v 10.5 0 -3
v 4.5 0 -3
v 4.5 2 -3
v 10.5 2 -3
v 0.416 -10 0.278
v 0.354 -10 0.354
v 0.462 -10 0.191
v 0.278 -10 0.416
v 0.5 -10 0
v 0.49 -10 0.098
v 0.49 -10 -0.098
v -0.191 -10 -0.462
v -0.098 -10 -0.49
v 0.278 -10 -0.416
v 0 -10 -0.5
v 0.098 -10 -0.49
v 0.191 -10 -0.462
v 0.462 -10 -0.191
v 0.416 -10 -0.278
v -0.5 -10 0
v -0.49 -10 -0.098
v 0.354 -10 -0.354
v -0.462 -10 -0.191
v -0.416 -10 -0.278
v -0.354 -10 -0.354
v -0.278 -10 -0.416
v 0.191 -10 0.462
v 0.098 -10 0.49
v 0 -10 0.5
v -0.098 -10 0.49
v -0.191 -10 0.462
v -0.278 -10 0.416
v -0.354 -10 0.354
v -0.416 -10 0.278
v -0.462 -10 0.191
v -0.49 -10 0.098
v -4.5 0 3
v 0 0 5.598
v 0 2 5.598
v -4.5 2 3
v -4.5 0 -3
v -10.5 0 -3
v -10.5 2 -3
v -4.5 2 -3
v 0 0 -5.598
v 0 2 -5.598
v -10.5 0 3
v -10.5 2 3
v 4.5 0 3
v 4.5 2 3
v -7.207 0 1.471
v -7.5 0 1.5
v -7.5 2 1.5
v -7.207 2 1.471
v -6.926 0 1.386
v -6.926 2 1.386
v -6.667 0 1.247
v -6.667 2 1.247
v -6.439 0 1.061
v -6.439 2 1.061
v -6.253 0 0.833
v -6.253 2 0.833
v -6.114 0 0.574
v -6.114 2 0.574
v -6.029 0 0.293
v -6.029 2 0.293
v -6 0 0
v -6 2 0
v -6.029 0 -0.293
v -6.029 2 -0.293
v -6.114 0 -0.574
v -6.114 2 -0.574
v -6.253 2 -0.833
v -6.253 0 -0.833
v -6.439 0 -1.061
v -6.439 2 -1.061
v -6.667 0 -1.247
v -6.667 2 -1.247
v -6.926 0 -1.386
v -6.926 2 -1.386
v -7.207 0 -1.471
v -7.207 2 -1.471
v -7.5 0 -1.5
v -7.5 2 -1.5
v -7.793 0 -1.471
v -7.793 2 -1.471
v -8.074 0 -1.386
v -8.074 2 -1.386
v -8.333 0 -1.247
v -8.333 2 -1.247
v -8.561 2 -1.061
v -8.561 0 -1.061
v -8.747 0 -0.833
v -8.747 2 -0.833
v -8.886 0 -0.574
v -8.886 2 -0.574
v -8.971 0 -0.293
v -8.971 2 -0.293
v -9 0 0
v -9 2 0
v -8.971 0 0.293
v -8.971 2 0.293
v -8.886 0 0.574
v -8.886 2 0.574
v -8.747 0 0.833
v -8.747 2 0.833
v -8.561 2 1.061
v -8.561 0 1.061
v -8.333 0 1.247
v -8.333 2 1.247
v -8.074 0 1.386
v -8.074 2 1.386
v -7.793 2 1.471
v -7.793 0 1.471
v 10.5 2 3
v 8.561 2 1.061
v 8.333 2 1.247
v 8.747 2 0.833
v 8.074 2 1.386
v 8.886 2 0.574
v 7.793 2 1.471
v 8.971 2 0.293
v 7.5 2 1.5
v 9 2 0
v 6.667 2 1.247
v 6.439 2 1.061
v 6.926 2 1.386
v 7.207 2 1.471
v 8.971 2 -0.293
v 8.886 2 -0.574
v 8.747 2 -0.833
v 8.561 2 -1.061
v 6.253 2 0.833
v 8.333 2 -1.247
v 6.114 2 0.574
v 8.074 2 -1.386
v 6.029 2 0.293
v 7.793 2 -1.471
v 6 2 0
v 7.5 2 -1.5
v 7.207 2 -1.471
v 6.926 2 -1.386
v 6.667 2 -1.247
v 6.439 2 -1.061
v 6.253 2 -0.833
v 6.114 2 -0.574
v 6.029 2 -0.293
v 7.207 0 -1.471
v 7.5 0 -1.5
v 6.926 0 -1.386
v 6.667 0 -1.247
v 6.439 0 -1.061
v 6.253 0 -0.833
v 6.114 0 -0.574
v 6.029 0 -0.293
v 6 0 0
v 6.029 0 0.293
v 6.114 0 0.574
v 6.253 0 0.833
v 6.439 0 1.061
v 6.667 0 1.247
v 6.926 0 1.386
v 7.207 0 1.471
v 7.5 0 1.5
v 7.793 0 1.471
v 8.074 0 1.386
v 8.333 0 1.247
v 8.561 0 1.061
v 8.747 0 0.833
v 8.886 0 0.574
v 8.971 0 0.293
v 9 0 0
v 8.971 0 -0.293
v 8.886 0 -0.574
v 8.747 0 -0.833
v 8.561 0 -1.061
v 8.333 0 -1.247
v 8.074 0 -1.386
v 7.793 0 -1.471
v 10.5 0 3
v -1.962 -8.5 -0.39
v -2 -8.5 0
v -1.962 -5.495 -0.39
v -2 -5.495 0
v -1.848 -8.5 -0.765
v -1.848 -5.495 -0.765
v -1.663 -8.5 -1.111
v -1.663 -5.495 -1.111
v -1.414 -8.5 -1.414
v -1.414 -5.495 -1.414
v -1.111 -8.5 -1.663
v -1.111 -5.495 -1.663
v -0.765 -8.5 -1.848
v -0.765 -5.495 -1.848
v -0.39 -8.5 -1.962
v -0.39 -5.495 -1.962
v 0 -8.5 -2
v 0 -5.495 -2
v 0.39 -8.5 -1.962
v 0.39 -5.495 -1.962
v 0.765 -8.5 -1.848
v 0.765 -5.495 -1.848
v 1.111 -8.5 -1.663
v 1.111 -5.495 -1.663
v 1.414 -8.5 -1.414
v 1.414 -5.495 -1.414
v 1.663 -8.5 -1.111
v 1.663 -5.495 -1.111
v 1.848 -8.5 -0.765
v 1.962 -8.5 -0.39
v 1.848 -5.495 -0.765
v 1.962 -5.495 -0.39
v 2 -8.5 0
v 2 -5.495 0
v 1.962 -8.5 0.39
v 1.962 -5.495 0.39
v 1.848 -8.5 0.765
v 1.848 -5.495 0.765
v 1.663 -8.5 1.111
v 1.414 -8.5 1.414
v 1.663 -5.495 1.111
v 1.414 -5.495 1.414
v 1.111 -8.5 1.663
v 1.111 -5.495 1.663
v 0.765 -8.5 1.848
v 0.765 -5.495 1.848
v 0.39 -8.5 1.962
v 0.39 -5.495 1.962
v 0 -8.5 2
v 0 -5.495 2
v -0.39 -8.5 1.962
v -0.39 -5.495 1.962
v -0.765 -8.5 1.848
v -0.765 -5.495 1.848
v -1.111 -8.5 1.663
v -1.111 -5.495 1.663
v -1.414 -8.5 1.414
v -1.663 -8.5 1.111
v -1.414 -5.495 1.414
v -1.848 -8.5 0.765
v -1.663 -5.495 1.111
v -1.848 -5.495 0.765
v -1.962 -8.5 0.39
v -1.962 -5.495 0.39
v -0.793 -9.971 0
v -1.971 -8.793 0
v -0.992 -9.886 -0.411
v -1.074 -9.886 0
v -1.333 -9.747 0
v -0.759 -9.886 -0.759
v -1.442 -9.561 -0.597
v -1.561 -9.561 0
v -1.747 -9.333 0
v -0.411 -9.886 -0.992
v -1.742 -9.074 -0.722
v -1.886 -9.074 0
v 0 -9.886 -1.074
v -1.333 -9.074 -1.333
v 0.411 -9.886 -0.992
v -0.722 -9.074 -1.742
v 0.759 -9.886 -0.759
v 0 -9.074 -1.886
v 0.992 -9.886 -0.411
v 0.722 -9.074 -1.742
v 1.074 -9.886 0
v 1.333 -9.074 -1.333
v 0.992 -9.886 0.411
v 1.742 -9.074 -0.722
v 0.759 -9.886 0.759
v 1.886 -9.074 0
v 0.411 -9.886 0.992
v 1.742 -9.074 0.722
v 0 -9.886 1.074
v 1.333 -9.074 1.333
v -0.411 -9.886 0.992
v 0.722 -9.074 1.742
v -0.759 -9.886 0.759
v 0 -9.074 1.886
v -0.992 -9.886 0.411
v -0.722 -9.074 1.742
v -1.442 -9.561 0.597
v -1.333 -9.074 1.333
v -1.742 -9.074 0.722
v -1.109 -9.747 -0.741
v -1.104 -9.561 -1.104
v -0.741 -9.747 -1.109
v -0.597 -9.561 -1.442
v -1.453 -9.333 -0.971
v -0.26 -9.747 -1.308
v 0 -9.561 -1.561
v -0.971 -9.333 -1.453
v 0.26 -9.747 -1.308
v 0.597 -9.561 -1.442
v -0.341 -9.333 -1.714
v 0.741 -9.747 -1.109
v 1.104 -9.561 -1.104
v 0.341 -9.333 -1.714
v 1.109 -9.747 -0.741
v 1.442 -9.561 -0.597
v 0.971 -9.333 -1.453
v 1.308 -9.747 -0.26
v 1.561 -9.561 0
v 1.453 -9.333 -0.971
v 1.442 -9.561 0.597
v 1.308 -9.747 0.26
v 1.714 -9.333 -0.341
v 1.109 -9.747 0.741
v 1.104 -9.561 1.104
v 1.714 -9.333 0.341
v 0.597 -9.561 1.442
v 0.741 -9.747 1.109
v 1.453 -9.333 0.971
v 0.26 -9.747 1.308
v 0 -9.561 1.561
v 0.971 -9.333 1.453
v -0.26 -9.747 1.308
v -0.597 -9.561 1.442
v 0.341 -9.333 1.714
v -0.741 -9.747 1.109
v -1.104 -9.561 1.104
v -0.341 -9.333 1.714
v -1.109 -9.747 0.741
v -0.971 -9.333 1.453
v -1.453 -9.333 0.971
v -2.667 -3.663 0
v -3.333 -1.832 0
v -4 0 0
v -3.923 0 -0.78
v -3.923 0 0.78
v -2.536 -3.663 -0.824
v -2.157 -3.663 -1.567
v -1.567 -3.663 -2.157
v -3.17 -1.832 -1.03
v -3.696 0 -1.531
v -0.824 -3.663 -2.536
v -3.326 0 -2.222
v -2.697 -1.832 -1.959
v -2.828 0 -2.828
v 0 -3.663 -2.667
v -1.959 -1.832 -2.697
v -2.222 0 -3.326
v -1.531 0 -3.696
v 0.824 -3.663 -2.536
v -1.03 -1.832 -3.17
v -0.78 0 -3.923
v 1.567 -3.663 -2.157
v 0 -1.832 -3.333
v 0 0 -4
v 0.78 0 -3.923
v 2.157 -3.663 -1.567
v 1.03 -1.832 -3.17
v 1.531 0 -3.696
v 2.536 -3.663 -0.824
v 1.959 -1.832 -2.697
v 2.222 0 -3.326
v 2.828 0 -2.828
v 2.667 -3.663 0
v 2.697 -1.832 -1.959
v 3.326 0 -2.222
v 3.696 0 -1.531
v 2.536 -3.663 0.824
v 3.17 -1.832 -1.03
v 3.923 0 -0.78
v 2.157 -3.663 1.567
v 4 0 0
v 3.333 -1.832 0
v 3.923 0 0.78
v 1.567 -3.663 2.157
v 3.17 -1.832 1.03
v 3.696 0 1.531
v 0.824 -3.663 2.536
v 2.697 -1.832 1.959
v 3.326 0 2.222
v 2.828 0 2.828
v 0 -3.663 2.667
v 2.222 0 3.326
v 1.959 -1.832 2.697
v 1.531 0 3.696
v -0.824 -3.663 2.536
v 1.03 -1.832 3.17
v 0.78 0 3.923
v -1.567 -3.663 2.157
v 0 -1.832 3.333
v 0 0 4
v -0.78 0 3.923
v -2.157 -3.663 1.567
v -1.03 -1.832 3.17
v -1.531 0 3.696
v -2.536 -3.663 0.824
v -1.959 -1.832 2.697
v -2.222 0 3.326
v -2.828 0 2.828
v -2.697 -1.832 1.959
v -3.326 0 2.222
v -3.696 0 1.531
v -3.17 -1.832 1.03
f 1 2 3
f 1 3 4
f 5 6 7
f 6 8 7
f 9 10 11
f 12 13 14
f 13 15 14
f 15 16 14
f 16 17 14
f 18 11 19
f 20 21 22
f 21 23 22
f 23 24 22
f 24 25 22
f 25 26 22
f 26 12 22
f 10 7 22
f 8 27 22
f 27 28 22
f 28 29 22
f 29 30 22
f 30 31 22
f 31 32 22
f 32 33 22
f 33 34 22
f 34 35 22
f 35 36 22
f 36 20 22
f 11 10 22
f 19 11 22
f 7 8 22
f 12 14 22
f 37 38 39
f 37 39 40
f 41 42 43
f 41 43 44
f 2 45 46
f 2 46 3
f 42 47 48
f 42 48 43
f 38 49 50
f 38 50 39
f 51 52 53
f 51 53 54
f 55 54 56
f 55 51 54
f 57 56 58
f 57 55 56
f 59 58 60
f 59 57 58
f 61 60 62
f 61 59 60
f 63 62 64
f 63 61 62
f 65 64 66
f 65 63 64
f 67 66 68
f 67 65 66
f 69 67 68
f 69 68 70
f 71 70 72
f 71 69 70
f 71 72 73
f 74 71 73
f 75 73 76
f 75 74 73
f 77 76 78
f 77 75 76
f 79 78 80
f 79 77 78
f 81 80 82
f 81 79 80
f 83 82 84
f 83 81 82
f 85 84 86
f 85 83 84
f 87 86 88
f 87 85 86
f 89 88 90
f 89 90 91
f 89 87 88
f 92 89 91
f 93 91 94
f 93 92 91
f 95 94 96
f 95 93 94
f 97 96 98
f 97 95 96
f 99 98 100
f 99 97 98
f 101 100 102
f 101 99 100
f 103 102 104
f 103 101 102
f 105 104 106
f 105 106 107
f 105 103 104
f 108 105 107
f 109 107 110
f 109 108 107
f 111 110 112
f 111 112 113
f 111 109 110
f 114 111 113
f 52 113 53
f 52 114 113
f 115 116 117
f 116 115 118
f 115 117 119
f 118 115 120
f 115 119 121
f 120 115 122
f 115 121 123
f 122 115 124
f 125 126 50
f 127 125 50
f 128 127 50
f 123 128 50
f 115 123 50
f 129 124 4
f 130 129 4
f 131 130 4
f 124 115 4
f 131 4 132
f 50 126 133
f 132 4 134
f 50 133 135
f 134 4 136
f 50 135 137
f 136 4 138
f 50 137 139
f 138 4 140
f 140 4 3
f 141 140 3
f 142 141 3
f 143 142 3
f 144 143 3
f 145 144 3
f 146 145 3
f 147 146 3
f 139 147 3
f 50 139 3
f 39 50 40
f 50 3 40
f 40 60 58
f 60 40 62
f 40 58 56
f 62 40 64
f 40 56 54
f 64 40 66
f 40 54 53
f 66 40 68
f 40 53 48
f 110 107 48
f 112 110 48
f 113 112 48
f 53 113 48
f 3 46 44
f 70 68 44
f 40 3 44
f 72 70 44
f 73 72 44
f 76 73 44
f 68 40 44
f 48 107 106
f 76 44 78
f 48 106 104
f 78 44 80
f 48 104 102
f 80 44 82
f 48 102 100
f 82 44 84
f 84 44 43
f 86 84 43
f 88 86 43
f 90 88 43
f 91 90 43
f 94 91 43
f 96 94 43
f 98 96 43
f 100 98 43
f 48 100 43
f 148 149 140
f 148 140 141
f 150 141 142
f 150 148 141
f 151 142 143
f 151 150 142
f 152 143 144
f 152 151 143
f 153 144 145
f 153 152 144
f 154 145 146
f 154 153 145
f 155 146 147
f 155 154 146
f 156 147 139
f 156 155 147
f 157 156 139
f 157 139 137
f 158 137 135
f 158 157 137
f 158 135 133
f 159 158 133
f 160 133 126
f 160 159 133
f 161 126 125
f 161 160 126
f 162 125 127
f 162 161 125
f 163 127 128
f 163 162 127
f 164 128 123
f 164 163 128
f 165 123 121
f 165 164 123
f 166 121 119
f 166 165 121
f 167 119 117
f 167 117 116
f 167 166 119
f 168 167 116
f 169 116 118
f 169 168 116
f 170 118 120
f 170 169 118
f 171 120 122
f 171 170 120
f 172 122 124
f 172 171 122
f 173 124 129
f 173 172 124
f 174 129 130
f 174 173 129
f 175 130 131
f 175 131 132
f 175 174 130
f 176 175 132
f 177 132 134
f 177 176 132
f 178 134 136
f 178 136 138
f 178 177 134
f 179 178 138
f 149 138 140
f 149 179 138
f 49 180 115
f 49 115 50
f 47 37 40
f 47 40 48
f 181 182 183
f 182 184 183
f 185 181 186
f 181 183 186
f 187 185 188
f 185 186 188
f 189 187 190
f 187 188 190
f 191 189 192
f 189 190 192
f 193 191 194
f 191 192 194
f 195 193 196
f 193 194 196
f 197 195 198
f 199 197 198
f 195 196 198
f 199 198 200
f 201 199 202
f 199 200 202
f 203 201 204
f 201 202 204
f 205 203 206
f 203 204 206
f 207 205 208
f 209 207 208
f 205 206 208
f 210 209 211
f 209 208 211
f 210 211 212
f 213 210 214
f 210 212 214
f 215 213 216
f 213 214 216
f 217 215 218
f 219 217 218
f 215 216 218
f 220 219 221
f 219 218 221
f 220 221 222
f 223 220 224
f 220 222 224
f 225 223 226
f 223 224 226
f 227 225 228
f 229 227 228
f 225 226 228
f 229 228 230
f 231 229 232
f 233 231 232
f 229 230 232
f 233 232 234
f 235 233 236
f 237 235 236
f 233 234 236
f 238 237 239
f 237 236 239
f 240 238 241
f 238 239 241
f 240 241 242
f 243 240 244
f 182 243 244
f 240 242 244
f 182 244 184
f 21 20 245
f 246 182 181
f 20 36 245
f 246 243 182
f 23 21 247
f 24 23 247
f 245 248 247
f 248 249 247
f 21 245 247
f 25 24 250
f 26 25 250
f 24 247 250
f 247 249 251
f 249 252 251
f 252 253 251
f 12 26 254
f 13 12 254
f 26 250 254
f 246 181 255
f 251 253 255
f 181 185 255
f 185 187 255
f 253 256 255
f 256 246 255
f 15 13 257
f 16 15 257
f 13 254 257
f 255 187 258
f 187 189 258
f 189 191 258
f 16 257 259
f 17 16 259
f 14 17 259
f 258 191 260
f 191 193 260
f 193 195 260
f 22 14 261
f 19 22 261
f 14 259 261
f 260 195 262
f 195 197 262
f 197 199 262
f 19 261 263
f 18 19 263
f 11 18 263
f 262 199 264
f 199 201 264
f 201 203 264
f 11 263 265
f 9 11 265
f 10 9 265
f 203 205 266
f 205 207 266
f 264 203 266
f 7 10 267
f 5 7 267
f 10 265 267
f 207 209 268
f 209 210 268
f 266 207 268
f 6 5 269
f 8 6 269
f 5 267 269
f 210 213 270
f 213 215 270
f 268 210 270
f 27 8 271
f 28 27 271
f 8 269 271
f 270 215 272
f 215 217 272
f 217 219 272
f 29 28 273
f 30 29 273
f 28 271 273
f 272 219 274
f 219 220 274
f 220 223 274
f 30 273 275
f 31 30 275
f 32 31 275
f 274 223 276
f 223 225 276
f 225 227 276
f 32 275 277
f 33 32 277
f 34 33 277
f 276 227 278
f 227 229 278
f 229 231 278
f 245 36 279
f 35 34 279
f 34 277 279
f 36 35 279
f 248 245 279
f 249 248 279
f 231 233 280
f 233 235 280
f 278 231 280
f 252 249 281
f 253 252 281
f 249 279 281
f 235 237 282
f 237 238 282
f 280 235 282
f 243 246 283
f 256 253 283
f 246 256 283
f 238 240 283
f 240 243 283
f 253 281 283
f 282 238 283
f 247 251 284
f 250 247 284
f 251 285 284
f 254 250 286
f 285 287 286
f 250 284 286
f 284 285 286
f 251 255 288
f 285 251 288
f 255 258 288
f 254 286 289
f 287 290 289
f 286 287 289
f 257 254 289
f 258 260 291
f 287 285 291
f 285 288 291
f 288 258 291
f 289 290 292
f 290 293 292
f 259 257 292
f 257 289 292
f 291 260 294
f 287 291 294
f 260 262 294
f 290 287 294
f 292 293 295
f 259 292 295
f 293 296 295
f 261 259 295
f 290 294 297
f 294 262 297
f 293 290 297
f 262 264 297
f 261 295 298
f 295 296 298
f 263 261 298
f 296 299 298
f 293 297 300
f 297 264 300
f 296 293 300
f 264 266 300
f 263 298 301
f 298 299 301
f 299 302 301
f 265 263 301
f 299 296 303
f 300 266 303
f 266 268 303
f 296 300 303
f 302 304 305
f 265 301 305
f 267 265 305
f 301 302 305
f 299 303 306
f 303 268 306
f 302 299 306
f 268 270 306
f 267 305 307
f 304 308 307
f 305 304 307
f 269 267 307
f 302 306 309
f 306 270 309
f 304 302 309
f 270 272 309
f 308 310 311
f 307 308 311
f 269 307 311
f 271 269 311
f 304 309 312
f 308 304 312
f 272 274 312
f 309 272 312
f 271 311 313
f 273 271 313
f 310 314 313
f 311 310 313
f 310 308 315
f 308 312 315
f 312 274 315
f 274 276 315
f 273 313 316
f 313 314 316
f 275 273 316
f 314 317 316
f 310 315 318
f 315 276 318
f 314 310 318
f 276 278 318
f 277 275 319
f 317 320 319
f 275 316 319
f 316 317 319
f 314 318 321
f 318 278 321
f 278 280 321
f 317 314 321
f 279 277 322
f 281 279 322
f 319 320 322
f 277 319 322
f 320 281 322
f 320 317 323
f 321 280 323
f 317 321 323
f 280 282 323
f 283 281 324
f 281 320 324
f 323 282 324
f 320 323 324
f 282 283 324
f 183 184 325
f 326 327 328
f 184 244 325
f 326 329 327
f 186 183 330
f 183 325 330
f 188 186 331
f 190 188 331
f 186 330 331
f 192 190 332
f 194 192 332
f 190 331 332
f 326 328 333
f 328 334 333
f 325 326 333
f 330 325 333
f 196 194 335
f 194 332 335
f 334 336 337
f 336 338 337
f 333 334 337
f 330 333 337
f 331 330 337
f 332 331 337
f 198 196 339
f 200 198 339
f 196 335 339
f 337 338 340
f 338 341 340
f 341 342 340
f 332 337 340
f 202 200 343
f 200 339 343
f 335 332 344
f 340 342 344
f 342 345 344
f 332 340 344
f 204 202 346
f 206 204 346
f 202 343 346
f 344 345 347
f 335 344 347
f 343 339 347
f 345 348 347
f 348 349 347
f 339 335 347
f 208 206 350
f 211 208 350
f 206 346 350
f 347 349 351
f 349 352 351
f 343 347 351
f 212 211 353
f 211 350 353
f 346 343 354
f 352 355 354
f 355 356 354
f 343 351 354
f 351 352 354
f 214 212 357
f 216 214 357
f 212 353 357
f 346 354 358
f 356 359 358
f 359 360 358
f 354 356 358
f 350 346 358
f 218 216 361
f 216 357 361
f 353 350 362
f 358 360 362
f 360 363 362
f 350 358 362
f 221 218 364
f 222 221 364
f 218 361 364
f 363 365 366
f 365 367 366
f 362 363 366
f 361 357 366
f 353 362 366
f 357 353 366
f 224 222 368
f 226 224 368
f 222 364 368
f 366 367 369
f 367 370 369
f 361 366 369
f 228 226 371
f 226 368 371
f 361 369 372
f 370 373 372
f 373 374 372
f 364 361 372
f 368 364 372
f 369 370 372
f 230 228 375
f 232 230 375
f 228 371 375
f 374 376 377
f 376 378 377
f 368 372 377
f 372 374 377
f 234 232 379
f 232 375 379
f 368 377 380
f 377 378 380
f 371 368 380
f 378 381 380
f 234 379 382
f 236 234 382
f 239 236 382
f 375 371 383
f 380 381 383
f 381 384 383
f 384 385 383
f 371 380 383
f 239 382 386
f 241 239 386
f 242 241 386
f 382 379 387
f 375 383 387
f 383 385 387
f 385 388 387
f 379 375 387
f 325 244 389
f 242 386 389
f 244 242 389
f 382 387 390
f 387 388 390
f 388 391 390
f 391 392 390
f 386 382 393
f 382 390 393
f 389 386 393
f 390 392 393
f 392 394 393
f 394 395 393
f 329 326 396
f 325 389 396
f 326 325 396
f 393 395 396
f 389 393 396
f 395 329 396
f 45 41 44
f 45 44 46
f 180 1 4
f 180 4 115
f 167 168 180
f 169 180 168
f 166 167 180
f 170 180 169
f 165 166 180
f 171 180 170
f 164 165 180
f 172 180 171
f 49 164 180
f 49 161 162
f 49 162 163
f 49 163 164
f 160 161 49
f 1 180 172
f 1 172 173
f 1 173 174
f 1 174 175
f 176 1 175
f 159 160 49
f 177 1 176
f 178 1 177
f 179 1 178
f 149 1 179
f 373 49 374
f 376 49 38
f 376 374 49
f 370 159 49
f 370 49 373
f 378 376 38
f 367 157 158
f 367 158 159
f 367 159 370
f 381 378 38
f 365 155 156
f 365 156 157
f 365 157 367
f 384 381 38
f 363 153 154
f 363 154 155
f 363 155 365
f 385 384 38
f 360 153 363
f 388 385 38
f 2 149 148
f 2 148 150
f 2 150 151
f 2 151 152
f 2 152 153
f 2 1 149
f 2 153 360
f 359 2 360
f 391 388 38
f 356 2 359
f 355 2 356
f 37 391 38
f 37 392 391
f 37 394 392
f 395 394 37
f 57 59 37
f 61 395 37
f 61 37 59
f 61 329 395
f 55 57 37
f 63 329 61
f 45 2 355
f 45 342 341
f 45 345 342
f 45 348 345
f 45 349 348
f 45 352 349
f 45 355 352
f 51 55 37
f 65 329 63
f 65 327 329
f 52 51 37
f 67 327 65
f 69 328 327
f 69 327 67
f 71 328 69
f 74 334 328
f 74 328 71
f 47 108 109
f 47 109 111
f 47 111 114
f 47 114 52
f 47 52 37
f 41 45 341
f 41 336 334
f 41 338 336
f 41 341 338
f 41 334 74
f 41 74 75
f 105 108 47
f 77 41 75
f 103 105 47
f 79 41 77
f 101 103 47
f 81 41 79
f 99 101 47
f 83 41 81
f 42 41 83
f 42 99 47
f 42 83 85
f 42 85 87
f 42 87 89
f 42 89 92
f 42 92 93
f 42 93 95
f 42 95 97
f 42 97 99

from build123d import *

# Parameters (mm, degrees)
SKETCH1_R           = 1.5
BOSS_EXTRUDE1_DEPTH = 2


with BuildPart() as part:
    # Sketch1 → Boss-Extrude1 (new body)
    with BuildSketch(Plane(origin=(0, 0, 0), x_dir=(1, 0, 0), z_dir=(0, 1, 0))):
        Polygon((-4.5, 3), (0, 5.598076211), (4.5, 3), (10.5, 3), (10.5, -3), (4.5, -3), (0, -5.598076211), (-4.5, -3), (-10.5, -3), (-10.5, 3), align=None)
        with Locations(Location((-7.5, 0, 0), (0, 0, 270))):
            Circle(SKETCH1_R, mode=Mode.SUBTRACT)
        with Locations(Location((7.5, 0, 0), (0, 0, 90))):
            Circle(SKETCH1_R, mode=Mode.SUBTRACT)
    extrude(amount=BOSS_EXTRUDE1_DEPTH)

    # Sketch2 → Revolve1 (revolve)
    with BuildSketch(Plane.XY, mode=Mode.PRIVATE) as revolve1_sk:
        with BuildLine():
            Line((0, -10), (0.5, -10))
            ThreePointArc((0.5, -10), (1.560660172, -9.560660172), (2, -8.5))
            Line((2, -8.5), (2, 2))
            Line((2, 2), (0, 2))
            Line((0, 2), (0, -10))
        make_face()
        Polygon((4, 0), (2, 0), (2, -5.494954839), align=None)
    revolve(revolve1_sk.sketch.rotate(Axis((0, 2, 0), (0, -1, 0)), 180), axis=Axis((0, 2, 0), (0, -1, 0)))


solid = part.part
